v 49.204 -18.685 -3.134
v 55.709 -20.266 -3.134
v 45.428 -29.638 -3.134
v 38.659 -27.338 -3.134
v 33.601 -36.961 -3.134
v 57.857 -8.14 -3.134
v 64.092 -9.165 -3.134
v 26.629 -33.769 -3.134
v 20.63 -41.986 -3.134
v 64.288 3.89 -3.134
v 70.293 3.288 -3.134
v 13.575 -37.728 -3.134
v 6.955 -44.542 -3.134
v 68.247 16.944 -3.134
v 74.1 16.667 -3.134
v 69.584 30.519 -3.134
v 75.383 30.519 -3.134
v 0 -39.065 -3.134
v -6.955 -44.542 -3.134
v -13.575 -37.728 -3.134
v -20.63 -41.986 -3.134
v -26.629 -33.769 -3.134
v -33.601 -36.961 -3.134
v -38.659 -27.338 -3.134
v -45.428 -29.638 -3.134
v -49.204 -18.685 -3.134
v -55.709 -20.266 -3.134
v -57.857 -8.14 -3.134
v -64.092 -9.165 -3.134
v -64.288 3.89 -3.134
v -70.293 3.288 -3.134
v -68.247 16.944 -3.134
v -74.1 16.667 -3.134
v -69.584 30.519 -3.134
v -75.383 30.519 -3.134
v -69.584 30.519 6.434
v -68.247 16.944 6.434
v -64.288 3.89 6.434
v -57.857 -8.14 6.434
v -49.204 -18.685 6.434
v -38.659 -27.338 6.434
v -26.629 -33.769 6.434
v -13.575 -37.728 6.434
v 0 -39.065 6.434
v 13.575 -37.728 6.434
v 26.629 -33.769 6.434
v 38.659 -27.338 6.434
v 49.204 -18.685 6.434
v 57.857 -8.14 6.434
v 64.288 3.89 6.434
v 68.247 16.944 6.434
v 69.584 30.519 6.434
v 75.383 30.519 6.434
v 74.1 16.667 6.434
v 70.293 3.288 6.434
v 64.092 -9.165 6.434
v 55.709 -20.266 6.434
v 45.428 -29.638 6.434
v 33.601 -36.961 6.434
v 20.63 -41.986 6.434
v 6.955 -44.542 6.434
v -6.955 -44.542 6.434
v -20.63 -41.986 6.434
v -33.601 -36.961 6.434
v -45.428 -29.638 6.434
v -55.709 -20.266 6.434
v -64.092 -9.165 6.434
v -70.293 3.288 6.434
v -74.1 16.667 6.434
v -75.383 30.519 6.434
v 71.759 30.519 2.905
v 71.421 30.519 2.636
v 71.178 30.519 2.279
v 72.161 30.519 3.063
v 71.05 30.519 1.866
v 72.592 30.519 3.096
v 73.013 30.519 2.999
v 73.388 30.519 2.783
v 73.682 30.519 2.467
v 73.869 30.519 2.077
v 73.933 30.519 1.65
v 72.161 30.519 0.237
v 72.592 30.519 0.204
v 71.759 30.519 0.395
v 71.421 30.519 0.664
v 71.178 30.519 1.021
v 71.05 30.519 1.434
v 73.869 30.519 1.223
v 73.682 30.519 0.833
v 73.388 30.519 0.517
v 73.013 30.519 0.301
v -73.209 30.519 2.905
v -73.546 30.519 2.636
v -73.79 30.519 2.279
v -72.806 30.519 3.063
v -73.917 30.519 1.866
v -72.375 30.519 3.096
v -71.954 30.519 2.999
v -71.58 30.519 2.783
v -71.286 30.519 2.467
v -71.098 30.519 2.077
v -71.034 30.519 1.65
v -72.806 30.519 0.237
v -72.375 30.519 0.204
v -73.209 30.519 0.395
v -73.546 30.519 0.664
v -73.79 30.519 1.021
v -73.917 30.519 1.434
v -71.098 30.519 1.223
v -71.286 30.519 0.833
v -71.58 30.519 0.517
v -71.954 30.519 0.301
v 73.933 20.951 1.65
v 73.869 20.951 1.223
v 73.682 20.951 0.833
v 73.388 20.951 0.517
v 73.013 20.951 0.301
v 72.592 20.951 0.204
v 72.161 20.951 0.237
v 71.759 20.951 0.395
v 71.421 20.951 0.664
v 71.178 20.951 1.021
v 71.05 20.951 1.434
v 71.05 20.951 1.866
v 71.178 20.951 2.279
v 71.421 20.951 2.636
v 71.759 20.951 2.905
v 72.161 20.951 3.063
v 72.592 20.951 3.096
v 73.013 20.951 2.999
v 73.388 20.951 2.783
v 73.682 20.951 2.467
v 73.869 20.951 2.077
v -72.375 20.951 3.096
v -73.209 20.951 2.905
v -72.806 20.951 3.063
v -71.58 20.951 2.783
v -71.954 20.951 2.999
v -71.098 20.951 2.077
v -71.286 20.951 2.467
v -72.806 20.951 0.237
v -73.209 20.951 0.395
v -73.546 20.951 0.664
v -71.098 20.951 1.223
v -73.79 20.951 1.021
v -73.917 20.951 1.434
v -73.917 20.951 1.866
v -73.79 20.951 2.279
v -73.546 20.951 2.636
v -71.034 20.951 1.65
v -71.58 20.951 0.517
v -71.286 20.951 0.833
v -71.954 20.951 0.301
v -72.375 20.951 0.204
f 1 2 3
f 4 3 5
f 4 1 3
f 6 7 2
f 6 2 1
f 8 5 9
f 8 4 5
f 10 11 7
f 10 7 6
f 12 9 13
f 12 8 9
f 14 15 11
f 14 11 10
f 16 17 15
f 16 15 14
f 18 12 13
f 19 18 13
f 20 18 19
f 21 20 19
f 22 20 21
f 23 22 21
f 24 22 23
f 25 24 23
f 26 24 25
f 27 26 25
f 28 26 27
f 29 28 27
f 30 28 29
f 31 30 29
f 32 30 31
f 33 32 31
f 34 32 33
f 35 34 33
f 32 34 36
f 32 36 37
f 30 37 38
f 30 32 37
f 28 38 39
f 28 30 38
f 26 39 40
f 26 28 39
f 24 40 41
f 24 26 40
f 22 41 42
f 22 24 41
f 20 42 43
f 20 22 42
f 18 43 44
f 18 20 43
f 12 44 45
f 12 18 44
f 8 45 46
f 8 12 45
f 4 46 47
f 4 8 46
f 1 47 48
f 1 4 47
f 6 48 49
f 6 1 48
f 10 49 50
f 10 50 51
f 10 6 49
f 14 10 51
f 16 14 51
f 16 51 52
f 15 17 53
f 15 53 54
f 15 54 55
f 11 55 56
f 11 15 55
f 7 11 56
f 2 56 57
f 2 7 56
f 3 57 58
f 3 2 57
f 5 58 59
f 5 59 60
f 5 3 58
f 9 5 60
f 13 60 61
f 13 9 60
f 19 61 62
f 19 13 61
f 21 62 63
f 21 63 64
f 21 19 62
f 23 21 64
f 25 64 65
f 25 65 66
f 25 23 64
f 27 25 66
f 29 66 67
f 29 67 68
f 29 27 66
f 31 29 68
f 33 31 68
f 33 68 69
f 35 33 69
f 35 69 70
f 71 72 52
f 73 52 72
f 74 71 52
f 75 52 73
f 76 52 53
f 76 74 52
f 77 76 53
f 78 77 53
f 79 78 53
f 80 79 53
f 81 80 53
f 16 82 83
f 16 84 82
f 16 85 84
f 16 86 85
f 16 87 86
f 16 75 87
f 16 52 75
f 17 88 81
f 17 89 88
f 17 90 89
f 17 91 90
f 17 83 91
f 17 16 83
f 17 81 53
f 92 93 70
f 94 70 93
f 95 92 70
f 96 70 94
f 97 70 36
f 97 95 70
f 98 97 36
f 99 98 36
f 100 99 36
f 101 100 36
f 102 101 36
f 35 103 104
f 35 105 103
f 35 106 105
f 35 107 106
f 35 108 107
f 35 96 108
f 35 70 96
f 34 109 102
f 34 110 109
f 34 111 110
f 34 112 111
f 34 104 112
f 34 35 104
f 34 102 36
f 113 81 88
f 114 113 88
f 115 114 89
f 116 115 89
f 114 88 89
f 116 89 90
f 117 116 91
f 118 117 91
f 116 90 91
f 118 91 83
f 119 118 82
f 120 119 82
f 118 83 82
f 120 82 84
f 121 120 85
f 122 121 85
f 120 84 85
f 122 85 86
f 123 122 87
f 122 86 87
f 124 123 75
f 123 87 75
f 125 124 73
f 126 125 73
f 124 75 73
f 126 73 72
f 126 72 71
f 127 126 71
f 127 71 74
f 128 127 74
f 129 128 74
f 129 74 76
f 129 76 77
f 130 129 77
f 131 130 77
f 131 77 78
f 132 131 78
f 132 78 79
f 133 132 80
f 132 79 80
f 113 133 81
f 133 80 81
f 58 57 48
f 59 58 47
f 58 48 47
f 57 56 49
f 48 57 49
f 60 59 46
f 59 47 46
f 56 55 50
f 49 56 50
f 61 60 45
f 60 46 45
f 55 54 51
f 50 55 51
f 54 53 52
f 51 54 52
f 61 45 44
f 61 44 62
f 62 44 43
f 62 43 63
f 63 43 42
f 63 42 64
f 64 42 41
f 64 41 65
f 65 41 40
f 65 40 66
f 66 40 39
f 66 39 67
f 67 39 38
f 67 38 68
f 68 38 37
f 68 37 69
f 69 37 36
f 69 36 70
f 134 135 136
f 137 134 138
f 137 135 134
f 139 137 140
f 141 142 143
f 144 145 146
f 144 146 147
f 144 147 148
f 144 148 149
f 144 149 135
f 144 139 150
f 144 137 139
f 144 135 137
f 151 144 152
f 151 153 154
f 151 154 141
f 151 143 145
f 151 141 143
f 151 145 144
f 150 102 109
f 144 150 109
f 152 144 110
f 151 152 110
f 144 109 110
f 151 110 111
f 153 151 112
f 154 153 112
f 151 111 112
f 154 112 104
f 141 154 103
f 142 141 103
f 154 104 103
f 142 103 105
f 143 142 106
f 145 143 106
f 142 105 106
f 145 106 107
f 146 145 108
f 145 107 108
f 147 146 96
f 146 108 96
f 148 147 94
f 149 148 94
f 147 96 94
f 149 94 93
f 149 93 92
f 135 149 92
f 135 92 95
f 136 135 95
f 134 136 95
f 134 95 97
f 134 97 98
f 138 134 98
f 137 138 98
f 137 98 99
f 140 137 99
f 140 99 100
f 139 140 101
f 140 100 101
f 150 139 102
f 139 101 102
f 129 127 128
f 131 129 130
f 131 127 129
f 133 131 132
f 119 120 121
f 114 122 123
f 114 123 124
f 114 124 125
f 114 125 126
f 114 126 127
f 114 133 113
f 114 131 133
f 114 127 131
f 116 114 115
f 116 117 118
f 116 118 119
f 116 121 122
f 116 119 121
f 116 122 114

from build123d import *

# Parameters (mm, degrees)
BOSS_EXTRUDE1_DEPTH = 3.3
CUT_EXTRUDE1_DEPTH  = 3.3
SCALE1_SCALE        = 1.9329
SCALE2_SCALE        = 1.5


with BuildPart() as part:
    # Sketch1 → Boss-Extrude1 (new body)
    with BuildSketch(Plane.XY):
        with BuildLine():
            Line((-26, 0), (-24, 0))
            ThreePointArc((-24, 0), (0, -24), (24, 0))
            Line((24, 0), (26, 0))
            ThreePointArc((26, 0), (0, -26), (-26, 0))
        make_face()
    extrude(amount=BOSS_EXTRUDE1_DEPTH)

    # Sketch2 → Cut-Extrude1 (cut)
    with BuildSketch(Plane(origin=(0, 0, 0), x_dir=(1, 0, 0), z_dir=(0, 1, 0))):
        with BuildLine():
            ThreePointArc((24.5, -1.65), (25, -2.15), (25.5, -1.65))
            Line((25.5, -1.65), (24.5, -1.65))
        make_face()
        with BuildLine():
            Line((24.5, -1.65), (25.5, -1.65))
            ThreePointArc((25.5, -1.65), (25, -1.15), (24.5, -1.65))
        make_face()
        with BuildLine():
            ThreePointArc((-25.5, -1.65), (-25, -2.15), (-24.5, -1.65))
            Line((-24.5, -1.65), (-25.5, -1.65))
        make_face()
        with BuildLine():
            Line((-25.5, -1.65), (-24.5, -1.65))
            ThreePointArc((-24.5, -1.65), (-25, -1.15), (-25.5, -1.65))
        make_face()
    extrude(amount=-CUT_EXTRUDE1_DEPTH, mode=Mode.SUBTRACT)


with BuildPart() as part_1:
    # Scale1: scaled about (0, -16.068164215, 1.65)
    add(part.part.scale(SCALE1_SCALE).moved(Location((0, 14.989990396, -1.539285))))


with BuildPart() as part_2:
    # Scale2: scaled about (0, -16.068164215, 1.65)
    add(part_1.part.scale(SCALE2_SCALE).moved(Location((0, 8.034082107, -0.825))))


solid = part_2.part
